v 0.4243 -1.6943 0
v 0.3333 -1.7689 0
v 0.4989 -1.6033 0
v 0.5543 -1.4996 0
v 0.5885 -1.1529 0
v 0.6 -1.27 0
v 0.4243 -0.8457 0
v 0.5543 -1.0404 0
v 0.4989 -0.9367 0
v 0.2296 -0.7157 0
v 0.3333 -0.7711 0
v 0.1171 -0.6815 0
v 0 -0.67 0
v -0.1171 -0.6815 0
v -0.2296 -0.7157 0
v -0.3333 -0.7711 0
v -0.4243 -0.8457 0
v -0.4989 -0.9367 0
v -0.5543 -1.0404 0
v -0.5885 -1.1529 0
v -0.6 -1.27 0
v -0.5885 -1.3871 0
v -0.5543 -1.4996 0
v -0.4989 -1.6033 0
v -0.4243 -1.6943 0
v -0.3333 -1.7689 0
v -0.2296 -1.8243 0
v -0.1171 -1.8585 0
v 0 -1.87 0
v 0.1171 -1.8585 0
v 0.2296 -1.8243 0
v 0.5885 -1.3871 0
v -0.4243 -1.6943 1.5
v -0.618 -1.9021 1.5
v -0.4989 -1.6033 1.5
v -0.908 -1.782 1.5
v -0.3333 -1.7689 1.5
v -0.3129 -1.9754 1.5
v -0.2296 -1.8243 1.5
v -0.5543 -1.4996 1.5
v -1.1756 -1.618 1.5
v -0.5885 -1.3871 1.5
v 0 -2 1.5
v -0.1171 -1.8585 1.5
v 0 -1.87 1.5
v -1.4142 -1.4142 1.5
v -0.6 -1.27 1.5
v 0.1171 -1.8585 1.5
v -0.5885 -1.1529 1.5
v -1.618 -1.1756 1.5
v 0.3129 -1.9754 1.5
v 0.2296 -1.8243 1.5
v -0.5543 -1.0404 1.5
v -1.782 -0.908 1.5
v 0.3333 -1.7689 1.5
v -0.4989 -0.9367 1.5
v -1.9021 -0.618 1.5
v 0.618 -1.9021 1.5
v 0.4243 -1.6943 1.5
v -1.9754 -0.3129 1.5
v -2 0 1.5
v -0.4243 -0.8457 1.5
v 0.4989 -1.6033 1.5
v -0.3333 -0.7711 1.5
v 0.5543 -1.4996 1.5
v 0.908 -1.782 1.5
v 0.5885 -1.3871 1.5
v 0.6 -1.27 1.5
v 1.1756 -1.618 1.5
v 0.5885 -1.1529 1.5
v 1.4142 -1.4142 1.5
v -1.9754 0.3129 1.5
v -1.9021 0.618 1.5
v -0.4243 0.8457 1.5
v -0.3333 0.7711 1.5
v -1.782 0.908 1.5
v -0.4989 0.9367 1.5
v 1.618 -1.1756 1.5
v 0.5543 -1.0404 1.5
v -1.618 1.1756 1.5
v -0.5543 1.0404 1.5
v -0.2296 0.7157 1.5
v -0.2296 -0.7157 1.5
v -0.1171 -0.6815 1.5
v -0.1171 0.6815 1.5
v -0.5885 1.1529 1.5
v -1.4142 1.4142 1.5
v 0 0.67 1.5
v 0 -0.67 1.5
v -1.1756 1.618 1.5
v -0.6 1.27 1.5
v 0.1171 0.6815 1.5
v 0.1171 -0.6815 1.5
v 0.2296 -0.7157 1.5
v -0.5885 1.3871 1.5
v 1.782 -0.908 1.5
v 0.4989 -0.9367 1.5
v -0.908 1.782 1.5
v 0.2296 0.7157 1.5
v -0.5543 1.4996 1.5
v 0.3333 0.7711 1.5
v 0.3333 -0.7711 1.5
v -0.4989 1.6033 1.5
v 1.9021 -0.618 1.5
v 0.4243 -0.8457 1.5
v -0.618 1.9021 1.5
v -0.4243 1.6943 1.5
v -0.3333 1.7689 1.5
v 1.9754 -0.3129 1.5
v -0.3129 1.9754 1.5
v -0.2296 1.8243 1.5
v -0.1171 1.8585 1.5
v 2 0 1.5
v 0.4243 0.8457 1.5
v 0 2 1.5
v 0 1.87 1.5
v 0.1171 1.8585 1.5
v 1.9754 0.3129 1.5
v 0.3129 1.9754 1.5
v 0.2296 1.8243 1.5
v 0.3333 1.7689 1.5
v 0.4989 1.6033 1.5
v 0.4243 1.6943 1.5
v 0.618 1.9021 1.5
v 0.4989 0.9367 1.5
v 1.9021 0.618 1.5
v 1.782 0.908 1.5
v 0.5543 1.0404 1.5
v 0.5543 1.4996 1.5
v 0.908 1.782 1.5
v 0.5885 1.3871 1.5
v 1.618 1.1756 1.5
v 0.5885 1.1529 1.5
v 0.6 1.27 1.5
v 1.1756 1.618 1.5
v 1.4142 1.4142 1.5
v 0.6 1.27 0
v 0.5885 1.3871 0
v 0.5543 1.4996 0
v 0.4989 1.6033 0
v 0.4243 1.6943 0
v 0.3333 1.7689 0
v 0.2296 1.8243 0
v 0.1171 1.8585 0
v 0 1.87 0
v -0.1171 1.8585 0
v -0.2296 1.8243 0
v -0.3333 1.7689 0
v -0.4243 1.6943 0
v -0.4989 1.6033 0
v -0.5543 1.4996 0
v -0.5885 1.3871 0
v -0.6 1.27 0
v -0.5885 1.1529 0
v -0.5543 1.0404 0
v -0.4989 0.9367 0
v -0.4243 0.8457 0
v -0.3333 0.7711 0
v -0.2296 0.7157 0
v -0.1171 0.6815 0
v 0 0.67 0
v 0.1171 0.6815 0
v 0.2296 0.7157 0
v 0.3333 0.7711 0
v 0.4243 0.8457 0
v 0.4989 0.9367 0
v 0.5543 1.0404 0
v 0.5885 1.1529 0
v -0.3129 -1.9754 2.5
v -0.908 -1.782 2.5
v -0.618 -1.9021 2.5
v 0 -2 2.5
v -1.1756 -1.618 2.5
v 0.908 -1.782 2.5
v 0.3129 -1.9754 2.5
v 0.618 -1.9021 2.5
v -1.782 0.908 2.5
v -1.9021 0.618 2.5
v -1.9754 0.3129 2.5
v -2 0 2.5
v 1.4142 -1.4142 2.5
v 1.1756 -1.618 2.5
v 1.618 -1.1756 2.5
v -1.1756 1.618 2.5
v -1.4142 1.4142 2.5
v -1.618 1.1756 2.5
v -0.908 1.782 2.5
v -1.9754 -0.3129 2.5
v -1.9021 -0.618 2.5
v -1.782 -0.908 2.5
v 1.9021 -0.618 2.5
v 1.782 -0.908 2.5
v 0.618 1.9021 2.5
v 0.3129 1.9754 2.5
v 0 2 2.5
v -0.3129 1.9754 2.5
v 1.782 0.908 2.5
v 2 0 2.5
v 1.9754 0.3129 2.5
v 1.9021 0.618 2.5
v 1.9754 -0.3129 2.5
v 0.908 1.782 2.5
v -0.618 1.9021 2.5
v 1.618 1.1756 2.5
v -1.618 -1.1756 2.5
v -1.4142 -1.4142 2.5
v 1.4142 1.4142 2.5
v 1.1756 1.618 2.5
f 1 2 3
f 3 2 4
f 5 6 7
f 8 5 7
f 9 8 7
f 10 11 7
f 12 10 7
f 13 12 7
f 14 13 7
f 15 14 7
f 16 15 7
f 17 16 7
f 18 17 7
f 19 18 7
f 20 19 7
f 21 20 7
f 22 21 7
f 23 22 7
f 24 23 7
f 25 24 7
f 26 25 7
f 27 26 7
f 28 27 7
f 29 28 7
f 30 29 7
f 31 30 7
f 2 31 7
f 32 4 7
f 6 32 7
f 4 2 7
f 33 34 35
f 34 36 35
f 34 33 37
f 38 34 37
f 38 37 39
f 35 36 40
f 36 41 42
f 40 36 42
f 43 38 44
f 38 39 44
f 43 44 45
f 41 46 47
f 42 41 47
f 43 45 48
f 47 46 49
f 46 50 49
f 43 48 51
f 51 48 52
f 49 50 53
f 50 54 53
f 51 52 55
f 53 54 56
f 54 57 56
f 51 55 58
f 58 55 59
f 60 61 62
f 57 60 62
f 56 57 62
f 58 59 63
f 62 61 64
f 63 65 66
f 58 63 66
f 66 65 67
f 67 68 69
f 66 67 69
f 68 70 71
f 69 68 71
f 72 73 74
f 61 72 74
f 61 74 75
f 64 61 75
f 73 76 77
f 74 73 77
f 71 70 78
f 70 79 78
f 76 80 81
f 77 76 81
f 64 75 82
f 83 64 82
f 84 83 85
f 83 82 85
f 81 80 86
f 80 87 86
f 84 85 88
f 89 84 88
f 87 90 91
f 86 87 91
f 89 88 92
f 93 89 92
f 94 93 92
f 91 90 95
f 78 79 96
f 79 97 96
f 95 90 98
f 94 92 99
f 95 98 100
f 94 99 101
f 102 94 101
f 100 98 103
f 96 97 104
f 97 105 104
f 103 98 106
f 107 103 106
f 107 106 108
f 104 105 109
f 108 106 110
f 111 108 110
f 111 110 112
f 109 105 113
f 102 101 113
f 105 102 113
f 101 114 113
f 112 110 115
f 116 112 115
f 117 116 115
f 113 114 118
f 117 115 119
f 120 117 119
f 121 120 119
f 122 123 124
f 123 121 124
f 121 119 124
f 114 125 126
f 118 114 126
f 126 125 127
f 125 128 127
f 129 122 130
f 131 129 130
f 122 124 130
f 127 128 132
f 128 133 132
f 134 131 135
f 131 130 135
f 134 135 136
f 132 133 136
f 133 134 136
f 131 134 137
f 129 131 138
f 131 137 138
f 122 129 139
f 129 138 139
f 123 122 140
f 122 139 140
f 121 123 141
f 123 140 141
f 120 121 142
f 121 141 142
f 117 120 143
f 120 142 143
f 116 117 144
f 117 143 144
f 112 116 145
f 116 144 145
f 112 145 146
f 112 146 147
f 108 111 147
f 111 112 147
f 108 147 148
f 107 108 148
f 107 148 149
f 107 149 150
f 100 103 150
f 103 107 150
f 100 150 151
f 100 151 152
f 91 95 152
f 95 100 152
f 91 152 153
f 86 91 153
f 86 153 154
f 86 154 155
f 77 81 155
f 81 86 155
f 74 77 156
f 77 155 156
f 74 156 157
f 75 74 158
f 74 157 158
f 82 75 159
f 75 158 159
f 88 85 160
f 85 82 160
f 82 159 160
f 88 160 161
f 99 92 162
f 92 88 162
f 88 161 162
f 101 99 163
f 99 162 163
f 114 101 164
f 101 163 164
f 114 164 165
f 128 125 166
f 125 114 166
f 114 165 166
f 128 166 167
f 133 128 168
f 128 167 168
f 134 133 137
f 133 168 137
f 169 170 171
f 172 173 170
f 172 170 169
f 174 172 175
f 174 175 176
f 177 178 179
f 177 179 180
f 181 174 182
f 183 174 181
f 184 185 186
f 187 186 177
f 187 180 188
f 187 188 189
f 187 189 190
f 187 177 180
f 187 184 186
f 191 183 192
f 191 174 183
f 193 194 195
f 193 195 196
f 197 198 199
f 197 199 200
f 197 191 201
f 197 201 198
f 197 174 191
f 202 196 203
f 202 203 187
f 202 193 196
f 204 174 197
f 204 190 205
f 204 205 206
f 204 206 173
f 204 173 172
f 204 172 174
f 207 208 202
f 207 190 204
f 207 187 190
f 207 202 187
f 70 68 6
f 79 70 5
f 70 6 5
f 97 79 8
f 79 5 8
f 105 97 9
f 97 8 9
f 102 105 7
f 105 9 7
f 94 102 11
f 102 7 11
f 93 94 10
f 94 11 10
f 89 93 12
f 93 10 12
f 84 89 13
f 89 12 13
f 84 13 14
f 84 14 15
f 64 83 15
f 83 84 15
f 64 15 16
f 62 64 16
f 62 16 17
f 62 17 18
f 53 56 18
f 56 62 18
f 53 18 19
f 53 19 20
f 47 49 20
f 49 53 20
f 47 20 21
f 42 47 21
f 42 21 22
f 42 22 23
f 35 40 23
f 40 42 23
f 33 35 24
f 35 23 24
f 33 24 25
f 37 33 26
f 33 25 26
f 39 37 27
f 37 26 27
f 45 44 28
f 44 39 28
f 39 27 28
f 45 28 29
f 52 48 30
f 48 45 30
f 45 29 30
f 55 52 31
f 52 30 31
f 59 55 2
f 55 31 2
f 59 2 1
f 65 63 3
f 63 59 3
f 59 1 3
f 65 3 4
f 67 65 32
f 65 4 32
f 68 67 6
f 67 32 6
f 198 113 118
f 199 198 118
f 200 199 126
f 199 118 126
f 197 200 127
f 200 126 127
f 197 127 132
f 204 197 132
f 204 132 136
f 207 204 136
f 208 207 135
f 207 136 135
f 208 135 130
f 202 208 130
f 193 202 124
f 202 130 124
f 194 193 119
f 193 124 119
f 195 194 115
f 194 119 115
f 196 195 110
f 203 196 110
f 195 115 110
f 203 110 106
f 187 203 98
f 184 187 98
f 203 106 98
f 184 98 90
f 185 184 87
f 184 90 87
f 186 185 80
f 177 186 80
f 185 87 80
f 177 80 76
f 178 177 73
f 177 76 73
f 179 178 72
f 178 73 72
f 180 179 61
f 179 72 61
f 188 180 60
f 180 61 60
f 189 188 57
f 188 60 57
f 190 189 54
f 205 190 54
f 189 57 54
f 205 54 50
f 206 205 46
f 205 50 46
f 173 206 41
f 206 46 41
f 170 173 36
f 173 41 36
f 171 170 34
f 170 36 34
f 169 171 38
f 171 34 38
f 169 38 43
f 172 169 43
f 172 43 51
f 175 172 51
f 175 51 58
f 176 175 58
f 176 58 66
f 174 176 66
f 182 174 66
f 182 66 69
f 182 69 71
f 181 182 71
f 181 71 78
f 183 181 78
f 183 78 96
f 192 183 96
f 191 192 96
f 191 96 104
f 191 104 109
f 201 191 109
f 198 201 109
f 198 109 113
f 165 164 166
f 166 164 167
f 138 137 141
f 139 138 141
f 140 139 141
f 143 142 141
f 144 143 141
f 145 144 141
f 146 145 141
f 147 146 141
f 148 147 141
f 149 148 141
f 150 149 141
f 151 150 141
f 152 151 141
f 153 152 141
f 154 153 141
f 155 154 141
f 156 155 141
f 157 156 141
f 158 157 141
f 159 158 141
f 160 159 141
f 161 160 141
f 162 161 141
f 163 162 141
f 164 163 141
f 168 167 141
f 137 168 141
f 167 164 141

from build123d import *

# Parameters (mm, degrees)
CYLINDER003_R     = 0.6
CYLINDER003_DEPTH = 2.5
CYLINDER004_R     = 0.6
CYLINDER004_DEPTH = 2.5
CYLINDER002_R     = 2
CYLINDER002_DEPTH = 1


with BuildPart() as cylinder003:
    # Cylinder003 → Cylinder003 (new body)
    with BuildSketch(Plane(origin=(0, 1.27, 0), x_dir=(1, 0, 0), z_dir=(0, 0, 1))):
        Circle(CYLINDER003_R)
    extrude(amount=CYLINDER003_DEPTH)


with BuildPart() as cylinder004:
    # Cylinder004 → Cylinder004 (new body)
    with BuildSketch(Plane(origin=(0, -1.27, 0), x_dir=(1, 0, 0), z_dir=(0, 0, 1))):
        Circle(CYLINDER004_R)
    extrude(amount=CYLINDER004_DEPTH)


with BuildPart() as led_slot_template:
    # Cylinder002 → Cylinder002 (new body)
    with BuildSketch(Plane.XY.offset(1.5)):
        Circle(CYLINDER002_R)
    extrude(amount=CYLINDER002_DEPTH)

    # Fusion: union Cylinder003, Cylinder004
    add(cylinder003.part)
    add(cylinder004.part)


solid = led_slot_template.part
